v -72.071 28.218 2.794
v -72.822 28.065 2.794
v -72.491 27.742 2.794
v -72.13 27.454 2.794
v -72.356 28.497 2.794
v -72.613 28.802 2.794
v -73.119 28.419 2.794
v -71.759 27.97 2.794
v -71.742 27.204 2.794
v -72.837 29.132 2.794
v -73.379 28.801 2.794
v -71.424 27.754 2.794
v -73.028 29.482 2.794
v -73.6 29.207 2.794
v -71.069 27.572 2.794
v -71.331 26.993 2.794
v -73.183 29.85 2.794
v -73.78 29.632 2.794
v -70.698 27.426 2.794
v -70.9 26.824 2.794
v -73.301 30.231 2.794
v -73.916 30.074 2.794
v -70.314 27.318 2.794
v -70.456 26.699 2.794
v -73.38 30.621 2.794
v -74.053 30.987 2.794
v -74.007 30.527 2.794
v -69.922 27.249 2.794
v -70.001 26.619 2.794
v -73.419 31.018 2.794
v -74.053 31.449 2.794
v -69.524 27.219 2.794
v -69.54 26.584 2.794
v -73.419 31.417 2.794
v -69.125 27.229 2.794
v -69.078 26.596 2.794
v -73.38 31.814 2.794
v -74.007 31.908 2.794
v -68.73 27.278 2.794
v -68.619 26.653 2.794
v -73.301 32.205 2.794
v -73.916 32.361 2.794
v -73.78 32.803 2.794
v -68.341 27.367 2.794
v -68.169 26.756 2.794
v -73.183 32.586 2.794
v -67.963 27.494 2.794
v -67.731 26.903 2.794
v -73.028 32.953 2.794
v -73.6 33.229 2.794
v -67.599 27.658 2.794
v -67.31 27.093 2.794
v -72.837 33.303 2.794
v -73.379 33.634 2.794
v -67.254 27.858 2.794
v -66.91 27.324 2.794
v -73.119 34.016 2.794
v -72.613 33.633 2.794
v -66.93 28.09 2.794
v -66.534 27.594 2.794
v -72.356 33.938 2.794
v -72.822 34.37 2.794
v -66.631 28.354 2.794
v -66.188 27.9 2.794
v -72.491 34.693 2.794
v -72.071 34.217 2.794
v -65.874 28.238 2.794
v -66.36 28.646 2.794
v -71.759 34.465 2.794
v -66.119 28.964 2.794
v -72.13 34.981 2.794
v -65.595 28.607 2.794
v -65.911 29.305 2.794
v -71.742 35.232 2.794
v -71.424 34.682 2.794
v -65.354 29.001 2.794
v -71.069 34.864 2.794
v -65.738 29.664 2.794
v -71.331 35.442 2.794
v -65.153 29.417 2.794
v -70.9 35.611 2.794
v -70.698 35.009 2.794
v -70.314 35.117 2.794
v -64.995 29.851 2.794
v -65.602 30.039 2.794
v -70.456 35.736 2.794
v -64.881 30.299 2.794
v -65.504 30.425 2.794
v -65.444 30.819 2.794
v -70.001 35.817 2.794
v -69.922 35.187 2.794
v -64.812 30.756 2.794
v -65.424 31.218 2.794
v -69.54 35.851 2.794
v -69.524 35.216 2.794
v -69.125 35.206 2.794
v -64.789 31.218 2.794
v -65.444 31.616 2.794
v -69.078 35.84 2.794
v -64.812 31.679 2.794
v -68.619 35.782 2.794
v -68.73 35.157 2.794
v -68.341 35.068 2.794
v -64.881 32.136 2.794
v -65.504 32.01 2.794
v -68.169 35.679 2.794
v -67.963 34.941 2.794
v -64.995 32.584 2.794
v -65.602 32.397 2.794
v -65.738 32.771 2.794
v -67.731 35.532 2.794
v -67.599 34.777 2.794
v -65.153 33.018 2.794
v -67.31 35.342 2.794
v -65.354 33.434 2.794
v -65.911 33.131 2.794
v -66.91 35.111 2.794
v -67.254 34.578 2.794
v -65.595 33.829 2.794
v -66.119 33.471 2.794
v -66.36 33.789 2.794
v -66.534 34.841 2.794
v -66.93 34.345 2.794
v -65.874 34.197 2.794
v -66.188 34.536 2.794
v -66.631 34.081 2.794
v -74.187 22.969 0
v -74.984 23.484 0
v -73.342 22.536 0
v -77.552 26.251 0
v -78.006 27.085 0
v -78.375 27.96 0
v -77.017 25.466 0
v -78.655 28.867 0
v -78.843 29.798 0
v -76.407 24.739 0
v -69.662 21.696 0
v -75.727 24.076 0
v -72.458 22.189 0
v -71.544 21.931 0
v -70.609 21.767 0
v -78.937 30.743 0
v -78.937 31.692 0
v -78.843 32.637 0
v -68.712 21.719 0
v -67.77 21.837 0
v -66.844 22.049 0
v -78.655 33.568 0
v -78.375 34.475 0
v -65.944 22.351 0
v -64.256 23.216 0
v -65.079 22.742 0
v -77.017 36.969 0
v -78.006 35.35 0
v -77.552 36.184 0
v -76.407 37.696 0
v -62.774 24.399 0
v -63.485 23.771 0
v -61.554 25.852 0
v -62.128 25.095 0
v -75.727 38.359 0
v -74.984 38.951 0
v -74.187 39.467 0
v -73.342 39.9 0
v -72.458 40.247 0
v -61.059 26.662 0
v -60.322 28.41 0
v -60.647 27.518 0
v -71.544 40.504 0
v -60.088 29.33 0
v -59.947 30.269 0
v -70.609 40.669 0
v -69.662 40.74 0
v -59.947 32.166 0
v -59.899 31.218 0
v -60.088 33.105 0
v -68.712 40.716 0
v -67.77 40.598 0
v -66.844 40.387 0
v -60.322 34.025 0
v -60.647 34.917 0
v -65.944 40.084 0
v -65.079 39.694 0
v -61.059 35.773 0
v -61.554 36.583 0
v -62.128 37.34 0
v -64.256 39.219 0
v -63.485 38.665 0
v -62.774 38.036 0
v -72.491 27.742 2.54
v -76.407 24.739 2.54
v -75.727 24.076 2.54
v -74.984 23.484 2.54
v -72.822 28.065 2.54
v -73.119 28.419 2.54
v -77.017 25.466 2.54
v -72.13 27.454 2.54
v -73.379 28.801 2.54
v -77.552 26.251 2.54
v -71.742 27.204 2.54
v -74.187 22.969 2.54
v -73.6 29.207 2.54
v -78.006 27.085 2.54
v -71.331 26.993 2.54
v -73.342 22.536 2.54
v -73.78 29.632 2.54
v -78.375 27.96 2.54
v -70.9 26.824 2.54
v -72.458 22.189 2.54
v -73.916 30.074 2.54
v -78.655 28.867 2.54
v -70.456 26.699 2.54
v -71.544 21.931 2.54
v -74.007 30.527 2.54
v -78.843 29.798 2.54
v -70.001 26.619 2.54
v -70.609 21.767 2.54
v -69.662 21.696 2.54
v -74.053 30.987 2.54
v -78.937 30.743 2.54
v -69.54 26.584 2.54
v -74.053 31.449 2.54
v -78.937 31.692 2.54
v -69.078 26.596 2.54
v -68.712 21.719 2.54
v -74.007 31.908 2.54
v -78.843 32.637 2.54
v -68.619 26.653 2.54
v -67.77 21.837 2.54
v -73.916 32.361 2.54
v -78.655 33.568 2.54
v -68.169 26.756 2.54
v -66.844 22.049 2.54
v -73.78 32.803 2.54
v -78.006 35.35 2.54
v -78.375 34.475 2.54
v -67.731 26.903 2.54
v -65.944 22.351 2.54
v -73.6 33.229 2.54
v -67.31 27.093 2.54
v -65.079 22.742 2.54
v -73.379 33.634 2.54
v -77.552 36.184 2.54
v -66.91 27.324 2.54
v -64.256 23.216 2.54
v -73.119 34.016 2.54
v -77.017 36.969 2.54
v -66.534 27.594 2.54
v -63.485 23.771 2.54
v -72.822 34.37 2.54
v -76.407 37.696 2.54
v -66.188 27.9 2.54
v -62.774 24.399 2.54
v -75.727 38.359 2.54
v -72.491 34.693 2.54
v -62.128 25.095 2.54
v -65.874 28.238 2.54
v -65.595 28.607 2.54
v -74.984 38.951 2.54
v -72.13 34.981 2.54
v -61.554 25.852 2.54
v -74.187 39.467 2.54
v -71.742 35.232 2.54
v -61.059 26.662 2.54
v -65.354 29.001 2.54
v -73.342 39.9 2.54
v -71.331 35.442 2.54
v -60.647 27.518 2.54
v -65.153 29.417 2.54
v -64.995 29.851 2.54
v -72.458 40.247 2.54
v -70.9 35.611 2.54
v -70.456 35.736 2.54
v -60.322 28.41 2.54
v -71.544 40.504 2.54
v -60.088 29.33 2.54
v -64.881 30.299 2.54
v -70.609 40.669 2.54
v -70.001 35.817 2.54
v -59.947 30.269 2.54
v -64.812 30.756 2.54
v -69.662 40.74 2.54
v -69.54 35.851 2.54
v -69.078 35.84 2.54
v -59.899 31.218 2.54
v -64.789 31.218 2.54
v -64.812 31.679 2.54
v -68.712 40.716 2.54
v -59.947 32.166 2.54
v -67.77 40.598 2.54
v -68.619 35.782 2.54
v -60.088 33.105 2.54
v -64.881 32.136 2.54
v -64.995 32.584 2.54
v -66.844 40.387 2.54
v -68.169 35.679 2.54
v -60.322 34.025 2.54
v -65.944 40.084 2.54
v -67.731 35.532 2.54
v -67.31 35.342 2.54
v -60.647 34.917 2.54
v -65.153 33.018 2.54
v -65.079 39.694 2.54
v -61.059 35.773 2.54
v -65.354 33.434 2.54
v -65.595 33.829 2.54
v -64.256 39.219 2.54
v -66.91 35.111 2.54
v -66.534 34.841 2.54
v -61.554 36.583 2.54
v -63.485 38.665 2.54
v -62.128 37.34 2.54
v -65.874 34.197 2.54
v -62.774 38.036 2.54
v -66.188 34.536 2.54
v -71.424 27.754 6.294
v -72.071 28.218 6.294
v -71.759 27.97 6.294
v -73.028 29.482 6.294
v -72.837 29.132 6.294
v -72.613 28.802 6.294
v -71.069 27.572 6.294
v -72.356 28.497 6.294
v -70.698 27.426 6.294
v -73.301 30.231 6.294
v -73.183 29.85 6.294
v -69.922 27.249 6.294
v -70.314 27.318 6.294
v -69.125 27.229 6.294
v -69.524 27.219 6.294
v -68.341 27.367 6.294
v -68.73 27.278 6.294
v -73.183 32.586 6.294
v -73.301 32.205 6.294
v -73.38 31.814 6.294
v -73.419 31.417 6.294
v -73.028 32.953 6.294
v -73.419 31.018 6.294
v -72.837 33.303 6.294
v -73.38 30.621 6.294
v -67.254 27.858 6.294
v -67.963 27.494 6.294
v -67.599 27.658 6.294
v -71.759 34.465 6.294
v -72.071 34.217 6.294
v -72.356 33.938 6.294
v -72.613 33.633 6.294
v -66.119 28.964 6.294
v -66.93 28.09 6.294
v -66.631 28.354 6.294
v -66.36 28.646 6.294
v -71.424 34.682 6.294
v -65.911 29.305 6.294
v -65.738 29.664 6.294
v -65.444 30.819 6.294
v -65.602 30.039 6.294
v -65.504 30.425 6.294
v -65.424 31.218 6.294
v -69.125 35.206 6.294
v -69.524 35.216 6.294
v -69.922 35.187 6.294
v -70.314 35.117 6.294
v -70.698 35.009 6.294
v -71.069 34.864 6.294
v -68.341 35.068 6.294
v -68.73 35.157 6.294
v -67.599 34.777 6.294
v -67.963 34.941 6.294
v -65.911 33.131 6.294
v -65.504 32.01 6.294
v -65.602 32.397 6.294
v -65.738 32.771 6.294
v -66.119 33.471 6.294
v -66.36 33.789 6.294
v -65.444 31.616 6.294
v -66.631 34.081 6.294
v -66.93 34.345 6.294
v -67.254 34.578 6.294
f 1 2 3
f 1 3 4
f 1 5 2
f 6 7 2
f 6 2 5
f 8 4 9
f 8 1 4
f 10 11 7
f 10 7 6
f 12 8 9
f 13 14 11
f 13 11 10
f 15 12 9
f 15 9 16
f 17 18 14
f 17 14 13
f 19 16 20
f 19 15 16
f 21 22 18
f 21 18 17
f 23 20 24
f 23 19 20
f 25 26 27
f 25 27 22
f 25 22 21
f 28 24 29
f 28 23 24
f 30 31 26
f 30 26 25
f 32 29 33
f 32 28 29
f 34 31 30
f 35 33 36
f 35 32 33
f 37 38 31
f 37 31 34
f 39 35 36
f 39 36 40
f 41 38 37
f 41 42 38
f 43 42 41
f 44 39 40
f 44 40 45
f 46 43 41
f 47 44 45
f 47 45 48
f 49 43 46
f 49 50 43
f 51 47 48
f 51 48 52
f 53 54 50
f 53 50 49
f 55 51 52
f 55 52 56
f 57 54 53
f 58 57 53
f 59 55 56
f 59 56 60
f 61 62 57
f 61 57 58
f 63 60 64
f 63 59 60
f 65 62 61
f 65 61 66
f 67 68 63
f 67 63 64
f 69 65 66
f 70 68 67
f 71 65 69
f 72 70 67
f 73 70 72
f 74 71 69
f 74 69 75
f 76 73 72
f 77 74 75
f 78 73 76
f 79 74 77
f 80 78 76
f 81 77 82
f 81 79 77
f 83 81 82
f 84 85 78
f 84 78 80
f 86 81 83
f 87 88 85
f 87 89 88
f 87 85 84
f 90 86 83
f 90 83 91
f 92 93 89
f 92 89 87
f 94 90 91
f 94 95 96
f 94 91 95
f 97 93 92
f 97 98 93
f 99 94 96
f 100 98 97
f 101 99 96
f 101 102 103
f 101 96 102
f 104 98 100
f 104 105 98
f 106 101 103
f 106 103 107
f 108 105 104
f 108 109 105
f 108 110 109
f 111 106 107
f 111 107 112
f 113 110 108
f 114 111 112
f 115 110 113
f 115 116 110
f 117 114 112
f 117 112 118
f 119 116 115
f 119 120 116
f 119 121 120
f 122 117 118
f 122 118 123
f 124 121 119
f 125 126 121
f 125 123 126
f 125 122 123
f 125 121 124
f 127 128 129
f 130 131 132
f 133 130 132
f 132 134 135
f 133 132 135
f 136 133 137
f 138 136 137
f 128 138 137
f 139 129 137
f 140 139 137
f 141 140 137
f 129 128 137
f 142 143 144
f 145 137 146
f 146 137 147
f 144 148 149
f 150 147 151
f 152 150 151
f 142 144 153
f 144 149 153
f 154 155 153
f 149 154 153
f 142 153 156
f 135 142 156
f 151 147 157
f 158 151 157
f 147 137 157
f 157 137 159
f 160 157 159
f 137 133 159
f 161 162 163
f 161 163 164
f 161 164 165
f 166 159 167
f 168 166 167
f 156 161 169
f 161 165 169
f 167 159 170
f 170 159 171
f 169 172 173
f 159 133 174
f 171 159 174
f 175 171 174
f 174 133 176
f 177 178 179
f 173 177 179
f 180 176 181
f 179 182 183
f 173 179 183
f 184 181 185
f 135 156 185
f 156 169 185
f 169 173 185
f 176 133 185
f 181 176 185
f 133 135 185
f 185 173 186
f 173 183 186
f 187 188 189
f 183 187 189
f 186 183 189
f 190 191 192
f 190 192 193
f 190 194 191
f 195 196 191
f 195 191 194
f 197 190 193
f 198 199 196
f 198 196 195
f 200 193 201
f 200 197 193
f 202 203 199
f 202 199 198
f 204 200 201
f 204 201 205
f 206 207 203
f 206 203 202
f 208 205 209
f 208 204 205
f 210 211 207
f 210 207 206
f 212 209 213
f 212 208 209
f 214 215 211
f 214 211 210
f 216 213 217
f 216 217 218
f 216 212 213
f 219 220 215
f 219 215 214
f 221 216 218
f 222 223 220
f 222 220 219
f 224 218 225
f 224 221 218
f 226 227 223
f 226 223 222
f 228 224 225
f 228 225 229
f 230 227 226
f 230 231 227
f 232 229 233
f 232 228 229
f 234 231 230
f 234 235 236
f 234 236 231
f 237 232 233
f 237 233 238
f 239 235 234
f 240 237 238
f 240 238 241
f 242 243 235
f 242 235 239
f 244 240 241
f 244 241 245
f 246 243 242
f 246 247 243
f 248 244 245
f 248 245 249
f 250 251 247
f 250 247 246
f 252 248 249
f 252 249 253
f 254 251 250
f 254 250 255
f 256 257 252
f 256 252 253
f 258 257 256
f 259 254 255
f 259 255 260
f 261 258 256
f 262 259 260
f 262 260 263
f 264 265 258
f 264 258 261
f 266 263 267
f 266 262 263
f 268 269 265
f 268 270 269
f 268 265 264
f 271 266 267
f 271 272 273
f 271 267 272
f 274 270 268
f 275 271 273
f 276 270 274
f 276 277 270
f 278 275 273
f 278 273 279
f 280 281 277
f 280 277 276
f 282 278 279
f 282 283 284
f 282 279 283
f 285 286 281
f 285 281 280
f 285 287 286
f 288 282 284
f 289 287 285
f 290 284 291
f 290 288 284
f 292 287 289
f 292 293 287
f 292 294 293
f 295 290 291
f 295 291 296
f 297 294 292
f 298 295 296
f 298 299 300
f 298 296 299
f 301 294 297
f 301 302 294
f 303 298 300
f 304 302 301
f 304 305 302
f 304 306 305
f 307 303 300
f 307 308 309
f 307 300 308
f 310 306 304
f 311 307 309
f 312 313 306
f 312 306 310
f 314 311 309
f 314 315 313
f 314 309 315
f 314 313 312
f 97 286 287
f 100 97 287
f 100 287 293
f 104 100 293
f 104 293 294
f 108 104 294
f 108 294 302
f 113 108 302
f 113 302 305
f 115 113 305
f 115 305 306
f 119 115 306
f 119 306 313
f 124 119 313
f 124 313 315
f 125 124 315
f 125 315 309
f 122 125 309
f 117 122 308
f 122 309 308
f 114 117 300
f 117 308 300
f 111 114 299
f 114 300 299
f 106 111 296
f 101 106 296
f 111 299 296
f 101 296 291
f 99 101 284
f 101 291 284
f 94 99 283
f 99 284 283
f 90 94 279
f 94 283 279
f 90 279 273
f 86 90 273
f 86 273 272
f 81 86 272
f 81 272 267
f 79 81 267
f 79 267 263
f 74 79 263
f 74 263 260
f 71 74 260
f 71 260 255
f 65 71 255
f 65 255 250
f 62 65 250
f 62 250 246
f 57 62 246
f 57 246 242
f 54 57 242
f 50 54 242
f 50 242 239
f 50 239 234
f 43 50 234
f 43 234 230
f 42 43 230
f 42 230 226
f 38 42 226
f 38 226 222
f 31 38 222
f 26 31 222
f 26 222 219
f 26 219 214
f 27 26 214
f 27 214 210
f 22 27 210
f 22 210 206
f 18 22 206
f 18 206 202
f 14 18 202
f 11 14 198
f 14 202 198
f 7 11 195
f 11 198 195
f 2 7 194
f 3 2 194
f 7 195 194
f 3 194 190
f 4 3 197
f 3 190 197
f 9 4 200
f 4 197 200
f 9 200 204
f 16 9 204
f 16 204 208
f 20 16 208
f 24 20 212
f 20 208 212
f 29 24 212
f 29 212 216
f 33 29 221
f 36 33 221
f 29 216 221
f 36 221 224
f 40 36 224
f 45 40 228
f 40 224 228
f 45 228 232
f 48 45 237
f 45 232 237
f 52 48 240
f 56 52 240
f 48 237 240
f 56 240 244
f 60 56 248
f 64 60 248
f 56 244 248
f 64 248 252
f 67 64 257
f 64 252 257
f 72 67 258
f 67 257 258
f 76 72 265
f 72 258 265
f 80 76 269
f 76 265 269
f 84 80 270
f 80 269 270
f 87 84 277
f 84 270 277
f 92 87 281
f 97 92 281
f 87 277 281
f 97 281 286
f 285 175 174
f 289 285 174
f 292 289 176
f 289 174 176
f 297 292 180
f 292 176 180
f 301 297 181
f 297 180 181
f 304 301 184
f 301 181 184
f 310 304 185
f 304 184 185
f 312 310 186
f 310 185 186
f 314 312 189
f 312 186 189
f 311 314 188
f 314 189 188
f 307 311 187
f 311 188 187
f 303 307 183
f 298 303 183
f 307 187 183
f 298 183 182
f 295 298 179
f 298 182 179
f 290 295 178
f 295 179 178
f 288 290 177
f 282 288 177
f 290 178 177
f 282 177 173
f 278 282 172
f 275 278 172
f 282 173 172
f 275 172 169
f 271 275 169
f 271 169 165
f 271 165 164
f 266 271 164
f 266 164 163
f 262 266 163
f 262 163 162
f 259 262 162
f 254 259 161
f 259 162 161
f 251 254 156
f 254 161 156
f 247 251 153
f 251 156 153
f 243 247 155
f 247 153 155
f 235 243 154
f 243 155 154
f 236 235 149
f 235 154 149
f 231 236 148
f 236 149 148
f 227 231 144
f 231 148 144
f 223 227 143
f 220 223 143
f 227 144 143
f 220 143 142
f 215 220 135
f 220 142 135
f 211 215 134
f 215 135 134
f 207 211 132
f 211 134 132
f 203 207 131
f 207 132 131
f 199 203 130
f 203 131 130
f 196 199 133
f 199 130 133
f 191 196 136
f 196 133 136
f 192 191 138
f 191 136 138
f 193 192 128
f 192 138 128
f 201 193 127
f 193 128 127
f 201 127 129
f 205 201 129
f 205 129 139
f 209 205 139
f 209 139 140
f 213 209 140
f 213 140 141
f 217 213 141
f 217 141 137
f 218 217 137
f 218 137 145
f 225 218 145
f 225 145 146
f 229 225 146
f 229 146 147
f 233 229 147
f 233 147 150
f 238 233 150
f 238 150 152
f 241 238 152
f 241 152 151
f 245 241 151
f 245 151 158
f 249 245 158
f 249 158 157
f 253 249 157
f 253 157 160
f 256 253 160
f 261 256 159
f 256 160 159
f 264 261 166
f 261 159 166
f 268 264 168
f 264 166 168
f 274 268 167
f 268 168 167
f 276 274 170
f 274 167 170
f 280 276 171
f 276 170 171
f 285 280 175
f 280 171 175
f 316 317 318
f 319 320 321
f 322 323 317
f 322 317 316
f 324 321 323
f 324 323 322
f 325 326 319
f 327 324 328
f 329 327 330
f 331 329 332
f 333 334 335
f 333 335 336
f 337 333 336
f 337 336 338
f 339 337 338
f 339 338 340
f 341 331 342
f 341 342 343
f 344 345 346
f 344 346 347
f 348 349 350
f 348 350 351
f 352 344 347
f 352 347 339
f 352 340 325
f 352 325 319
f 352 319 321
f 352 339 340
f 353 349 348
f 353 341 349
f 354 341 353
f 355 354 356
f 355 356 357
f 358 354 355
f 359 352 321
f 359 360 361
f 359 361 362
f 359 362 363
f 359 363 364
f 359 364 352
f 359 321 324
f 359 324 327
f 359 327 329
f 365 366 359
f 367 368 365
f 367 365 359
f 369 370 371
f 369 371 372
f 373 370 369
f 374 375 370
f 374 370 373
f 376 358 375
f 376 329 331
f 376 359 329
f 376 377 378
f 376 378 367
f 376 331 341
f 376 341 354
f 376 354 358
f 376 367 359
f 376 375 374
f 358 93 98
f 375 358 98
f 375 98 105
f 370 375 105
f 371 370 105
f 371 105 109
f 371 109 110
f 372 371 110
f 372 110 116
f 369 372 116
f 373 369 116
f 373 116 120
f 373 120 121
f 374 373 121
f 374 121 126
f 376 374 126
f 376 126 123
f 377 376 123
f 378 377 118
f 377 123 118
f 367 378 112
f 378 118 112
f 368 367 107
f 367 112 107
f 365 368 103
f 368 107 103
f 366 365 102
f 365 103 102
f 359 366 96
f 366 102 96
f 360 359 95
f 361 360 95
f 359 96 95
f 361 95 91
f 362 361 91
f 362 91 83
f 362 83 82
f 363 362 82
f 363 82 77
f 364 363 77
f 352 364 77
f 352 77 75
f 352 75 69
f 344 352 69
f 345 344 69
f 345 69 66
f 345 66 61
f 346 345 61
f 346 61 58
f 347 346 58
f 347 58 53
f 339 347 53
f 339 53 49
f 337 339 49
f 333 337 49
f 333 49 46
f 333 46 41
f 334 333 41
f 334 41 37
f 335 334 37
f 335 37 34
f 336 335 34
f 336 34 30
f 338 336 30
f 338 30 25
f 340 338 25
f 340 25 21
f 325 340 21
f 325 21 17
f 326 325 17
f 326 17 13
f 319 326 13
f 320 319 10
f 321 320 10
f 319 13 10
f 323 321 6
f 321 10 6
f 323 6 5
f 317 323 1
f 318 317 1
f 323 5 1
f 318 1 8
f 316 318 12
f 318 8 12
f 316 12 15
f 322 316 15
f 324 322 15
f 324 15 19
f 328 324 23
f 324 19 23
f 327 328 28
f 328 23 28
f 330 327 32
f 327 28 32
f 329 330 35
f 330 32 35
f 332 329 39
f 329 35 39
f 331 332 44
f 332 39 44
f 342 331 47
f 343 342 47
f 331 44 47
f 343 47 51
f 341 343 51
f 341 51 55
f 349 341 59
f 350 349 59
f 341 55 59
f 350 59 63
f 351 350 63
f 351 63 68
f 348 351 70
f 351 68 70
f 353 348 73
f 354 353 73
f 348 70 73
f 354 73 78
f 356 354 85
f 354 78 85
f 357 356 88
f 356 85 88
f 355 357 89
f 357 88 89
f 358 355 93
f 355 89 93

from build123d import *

# Parameters (mm, degrees)
F0_R     = 9.525
F0_R_2   = 4.635
F1_DEPTH = 2.54
F0_R_3   = 4
F2_DEPTH = 2.794
F3_DEPTH = 6.294


with BuildPart() as f1:
    # F0 (on Top) → F1 (new body)
    with BuildSketch(Plane.XY):
        with Locations((-69.424219, 31.217609)):
            Circle(F0_R)
        with Locations((-69.424219, 31.217609)):
            Circle(F0_R_2, mode=Mode.SUBTRACT)
    extrude(amount=F1_DEPTH)

    # F0 (on Top) → F2 (join)
    with BuildSketch(Plane.XY):
        with Locations((-69.424219, 31.217609)):
            Circle(F0_R_2)
        with Locations((-69.424219, 31.217609)):
            Circle(F0_R_3, mode=Mode.SUBTRACT)
    extrude(amount=F2_DEPTH)

    # F0 (on Top) → F3 (join)
    with BuildSketch(Plane.XY):
        with Locations((-69.424219, 31.217609)):
            Circle(F0_R_3)
    extrude(amount=F3_DEPTH)


solid = f1.part
